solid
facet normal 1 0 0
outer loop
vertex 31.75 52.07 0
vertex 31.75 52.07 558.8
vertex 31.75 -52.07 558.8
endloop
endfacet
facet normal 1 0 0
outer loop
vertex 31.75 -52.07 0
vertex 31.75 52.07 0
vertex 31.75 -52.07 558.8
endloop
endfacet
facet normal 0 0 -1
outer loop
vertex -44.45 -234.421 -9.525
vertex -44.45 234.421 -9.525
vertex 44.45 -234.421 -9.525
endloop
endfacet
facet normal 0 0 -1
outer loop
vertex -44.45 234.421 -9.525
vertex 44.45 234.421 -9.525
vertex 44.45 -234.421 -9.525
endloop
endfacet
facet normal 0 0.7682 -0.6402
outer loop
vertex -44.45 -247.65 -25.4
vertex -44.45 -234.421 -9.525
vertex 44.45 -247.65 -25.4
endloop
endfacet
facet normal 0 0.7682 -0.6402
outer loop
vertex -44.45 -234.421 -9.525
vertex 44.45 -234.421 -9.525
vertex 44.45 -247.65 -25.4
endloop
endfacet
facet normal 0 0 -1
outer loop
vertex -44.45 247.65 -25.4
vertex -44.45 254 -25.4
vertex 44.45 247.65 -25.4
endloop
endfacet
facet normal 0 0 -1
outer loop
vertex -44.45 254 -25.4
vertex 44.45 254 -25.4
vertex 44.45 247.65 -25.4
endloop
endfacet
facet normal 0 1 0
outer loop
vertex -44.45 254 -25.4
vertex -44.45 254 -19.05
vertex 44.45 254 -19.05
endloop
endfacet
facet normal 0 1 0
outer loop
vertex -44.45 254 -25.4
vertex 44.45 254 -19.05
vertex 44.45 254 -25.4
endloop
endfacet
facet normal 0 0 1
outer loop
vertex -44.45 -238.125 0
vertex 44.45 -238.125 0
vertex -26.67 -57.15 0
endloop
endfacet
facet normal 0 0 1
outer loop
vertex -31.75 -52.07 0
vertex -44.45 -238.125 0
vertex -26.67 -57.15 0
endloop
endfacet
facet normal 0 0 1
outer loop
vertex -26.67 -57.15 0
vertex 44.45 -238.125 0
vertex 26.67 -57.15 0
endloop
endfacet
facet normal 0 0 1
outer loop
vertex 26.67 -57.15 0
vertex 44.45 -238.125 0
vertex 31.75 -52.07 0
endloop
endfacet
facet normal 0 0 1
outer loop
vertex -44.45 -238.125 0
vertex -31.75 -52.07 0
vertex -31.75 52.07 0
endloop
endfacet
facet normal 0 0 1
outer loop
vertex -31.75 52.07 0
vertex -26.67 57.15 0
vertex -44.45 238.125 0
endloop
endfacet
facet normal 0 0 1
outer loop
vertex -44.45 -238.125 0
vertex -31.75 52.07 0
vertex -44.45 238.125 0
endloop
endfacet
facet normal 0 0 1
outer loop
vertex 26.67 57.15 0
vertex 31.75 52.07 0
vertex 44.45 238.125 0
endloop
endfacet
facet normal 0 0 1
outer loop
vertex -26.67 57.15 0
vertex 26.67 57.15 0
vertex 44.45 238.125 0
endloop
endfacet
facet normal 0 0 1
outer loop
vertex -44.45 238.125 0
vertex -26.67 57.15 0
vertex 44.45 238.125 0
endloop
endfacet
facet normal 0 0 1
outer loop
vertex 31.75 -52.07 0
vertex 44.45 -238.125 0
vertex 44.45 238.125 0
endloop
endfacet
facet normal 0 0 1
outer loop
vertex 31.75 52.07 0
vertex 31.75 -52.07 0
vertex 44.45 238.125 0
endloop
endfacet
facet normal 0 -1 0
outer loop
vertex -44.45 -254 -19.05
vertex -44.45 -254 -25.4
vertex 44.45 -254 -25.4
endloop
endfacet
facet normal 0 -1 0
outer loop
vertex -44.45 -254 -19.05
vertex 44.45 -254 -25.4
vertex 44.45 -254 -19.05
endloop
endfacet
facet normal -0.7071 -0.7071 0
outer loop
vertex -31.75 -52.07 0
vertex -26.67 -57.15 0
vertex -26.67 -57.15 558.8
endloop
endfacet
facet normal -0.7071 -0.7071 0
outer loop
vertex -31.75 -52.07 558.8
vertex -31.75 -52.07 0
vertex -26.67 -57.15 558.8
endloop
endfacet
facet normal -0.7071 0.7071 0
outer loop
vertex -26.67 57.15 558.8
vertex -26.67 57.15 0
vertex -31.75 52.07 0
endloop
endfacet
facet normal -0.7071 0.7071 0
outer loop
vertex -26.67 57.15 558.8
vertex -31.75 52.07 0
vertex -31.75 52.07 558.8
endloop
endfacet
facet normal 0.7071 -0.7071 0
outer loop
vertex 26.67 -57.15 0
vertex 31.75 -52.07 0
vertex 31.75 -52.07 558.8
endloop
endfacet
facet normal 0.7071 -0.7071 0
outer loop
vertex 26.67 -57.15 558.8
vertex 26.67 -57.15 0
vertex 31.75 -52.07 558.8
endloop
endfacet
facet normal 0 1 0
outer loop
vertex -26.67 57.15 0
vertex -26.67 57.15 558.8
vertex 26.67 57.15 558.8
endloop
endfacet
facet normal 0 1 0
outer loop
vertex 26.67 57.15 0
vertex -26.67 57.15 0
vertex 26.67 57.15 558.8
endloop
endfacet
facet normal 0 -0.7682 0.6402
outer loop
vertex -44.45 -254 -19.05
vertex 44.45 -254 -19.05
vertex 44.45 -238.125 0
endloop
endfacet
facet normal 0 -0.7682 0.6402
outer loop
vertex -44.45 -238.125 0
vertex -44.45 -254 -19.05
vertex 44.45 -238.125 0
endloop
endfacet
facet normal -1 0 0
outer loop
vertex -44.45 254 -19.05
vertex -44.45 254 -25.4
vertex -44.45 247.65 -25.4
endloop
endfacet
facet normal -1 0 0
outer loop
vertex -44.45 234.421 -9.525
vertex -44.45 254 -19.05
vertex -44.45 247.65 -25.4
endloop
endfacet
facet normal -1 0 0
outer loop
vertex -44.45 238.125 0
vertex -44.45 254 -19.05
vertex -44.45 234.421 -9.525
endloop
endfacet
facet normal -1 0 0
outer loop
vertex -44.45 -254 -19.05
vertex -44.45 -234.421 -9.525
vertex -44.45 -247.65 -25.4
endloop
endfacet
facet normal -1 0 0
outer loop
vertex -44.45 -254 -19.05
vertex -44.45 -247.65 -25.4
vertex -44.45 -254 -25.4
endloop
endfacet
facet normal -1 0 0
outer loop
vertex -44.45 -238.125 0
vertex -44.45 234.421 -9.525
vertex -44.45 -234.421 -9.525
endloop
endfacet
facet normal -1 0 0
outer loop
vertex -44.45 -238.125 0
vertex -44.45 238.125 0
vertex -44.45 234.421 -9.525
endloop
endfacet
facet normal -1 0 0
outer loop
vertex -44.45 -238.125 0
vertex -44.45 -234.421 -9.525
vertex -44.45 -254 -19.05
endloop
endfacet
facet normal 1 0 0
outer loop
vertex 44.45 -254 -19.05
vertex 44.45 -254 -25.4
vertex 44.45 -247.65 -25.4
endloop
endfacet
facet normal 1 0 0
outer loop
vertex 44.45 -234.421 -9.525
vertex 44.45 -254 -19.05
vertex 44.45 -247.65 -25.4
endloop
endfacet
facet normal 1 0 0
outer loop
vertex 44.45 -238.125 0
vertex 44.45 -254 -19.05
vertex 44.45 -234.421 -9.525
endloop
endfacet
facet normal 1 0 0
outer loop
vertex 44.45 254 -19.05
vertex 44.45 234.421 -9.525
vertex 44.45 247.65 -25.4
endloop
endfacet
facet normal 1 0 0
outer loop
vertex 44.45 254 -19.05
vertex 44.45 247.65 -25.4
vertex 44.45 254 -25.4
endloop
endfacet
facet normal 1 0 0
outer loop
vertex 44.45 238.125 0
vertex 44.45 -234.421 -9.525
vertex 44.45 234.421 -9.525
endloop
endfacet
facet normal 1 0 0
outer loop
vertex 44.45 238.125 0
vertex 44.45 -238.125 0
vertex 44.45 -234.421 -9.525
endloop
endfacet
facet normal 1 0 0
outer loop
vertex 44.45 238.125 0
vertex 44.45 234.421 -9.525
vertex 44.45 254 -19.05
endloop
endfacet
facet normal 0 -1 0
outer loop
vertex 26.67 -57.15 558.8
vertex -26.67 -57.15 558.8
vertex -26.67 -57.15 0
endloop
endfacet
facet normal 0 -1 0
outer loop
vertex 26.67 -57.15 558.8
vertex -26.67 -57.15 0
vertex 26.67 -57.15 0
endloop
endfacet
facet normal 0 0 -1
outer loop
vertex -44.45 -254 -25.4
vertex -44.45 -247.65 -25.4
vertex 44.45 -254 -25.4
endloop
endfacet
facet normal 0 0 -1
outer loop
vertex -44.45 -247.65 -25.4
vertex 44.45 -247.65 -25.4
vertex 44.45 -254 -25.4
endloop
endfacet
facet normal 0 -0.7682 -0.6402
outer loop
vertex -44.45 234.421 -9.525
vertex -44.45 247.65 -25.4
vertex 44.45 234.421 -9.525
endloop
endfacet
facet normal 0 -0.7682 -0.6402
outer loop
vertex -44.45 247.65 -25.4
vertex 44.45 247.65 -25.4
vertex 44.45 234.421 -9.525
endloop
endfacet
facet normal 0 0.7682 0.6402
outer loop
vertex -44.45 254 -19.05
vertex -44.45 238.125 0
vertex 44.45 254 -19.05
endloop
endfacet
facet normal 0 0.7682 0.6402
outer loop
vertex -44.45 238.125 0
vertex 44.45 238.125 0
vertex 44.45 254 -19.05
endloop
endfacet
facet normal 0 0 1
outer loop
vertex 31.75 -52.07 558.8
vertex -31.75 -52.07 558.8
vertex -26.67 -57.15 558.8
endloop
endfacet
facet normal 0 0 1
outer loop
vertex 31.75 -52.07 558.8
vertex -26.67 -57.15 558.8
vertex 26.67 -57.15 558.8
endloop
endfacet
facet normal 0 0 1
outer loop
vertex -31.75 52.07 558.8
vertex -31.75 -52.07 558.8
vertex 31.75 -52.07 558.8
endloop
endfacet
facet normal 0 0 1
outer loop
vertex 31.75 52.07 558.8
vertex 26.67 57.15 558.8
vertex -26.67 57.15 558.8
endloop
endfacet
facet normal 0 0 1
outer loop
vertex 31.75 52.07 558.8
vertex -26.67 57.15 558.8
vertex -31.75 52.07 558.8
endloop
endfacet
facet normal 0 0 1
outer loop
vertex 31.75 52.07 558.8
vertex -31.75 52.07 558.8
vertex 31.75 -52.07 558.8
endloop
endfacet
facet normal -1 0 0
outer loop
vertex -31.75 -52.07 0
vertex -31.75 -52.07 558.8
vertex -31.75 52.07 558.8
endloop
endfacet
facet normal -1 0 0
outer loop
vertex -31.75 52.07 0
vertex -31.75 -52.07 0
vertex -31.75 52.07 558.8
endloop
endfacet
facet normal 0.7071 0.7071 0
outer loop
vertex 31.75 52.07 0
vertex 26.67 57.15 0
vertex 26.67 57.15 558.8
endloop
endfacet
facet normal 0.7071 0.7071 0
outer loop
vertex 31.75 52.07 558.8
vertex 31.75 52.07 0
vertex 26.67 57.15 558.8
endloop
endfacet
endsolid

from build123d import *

# Parameters (mm, degrees)
F0_W      = 63.5
F0_H      = 114.3
F1_DEPTH  = 558.8
F2_SIZE   = 5.08
F4_DEPTH  = 25.4
F6_DEPTH  = 76.2
F8_DEPTH  = 12.7
F10_DEPTH = 12.7


with BuildPart() as f1:
    # F0 (on Top) → F1 (new body)
    with BuildSketch(Plane.XY):
        Rectangle(F0_W, F0_H)
    extrude(amount=F1_DEPTH)

    # F2
    f2_edges = [f1.edges().sort_by_distance(p)[0] for p in [
        (31.75, 57.15, 279.4),
        (-31.75, 57.15, 279.4),
        (-31.75, -57.15, 279.4),
        (31.75, -57.15, 279.4),
    ]]
    chamfer(f2_edges, length=F2_SIZE)

    # F3 (on face) → F4 (join)
    with BuildSketch(Plane(origin=(0, 0, 0), x_dir=(1, 0, 0), z_dir=(0, 0, -1))):
        Polygon((31.75, 52.07), (31.75, 254), (-31.75, 254), (-31.75, 52.07), (-26.67, 57.15), (26.67, 57.15), align=None)
        Polygon((31.75, -52.07), (31.75, 52.07), (26.67, 57.15), (-26.67, 57.15), (-31.75, 52.07), (-31.75, -52.07), (-26.67, -57.15), (26.67, -57.15), align=None)
        Polygon((31.75, -254), (31.75, -52.07), (26.67, -57.15), (-26.67, -57.15), (-31.75, -52.07), (-31.75, -254), align=None)
    extrude(amount=F4_DEPTH)

    # F5 (on face) → F6 (cut)
    with BuildSketch(Plane(origin=(-31.75, 0, 0), x_dir=(0, -1, 0), z_dir=(-1, 0, 0))):
        Polygon((238.125, 0), (254, -19.05), (254, 0), align=None)
        Polygon((-247.65, -25.4), (247.65, -25.4), (234.420833, -9.525), (-234.420833, -9.525), align=None)
        Polygon((-254, 0), (-254, -19.05), (-238.125, 0), align=None)
    extrude(amount=-F6_DEPTH, mode=Mode.SUBTRACT)

    # F7 (on face) → F8 (join)
    with BuildSketch(Plane.YZ.offset(31.75)):
        Polygon((238.125, 0), (52.07, 0), (-52.07, 0), (-238.125, 0), (-254, -19.05), (-254, -25.4), (-247.65, -25.4), (-234.420833, -9.525), (234.420833, -9.525), (247.65, -25.4), (254, -25.4), (254, -19.05), align=None)
    extrude(amount=F8_DEPTH)

    # F9 (on face) → F10 (join)
    with BuildSketch(Plane(origin=(-31.75, 0, 0), x_dir=(0, -1, 0), z_dir=(-1, 0, 0))):
        Polygon((238.125, 0), (52.07, 0), (-52.07, 0), (-238.125, 0), (-254, -19.05), (-254, -25.4), (-247.65, -25.4), (-234.420833, -9.525), (234.420833, -9.525), (247.65, -25.4), (254, -25.4), (254, -19.05), align=None)
    extrude(amount=F10_DEPTH)


solid = f1.part
